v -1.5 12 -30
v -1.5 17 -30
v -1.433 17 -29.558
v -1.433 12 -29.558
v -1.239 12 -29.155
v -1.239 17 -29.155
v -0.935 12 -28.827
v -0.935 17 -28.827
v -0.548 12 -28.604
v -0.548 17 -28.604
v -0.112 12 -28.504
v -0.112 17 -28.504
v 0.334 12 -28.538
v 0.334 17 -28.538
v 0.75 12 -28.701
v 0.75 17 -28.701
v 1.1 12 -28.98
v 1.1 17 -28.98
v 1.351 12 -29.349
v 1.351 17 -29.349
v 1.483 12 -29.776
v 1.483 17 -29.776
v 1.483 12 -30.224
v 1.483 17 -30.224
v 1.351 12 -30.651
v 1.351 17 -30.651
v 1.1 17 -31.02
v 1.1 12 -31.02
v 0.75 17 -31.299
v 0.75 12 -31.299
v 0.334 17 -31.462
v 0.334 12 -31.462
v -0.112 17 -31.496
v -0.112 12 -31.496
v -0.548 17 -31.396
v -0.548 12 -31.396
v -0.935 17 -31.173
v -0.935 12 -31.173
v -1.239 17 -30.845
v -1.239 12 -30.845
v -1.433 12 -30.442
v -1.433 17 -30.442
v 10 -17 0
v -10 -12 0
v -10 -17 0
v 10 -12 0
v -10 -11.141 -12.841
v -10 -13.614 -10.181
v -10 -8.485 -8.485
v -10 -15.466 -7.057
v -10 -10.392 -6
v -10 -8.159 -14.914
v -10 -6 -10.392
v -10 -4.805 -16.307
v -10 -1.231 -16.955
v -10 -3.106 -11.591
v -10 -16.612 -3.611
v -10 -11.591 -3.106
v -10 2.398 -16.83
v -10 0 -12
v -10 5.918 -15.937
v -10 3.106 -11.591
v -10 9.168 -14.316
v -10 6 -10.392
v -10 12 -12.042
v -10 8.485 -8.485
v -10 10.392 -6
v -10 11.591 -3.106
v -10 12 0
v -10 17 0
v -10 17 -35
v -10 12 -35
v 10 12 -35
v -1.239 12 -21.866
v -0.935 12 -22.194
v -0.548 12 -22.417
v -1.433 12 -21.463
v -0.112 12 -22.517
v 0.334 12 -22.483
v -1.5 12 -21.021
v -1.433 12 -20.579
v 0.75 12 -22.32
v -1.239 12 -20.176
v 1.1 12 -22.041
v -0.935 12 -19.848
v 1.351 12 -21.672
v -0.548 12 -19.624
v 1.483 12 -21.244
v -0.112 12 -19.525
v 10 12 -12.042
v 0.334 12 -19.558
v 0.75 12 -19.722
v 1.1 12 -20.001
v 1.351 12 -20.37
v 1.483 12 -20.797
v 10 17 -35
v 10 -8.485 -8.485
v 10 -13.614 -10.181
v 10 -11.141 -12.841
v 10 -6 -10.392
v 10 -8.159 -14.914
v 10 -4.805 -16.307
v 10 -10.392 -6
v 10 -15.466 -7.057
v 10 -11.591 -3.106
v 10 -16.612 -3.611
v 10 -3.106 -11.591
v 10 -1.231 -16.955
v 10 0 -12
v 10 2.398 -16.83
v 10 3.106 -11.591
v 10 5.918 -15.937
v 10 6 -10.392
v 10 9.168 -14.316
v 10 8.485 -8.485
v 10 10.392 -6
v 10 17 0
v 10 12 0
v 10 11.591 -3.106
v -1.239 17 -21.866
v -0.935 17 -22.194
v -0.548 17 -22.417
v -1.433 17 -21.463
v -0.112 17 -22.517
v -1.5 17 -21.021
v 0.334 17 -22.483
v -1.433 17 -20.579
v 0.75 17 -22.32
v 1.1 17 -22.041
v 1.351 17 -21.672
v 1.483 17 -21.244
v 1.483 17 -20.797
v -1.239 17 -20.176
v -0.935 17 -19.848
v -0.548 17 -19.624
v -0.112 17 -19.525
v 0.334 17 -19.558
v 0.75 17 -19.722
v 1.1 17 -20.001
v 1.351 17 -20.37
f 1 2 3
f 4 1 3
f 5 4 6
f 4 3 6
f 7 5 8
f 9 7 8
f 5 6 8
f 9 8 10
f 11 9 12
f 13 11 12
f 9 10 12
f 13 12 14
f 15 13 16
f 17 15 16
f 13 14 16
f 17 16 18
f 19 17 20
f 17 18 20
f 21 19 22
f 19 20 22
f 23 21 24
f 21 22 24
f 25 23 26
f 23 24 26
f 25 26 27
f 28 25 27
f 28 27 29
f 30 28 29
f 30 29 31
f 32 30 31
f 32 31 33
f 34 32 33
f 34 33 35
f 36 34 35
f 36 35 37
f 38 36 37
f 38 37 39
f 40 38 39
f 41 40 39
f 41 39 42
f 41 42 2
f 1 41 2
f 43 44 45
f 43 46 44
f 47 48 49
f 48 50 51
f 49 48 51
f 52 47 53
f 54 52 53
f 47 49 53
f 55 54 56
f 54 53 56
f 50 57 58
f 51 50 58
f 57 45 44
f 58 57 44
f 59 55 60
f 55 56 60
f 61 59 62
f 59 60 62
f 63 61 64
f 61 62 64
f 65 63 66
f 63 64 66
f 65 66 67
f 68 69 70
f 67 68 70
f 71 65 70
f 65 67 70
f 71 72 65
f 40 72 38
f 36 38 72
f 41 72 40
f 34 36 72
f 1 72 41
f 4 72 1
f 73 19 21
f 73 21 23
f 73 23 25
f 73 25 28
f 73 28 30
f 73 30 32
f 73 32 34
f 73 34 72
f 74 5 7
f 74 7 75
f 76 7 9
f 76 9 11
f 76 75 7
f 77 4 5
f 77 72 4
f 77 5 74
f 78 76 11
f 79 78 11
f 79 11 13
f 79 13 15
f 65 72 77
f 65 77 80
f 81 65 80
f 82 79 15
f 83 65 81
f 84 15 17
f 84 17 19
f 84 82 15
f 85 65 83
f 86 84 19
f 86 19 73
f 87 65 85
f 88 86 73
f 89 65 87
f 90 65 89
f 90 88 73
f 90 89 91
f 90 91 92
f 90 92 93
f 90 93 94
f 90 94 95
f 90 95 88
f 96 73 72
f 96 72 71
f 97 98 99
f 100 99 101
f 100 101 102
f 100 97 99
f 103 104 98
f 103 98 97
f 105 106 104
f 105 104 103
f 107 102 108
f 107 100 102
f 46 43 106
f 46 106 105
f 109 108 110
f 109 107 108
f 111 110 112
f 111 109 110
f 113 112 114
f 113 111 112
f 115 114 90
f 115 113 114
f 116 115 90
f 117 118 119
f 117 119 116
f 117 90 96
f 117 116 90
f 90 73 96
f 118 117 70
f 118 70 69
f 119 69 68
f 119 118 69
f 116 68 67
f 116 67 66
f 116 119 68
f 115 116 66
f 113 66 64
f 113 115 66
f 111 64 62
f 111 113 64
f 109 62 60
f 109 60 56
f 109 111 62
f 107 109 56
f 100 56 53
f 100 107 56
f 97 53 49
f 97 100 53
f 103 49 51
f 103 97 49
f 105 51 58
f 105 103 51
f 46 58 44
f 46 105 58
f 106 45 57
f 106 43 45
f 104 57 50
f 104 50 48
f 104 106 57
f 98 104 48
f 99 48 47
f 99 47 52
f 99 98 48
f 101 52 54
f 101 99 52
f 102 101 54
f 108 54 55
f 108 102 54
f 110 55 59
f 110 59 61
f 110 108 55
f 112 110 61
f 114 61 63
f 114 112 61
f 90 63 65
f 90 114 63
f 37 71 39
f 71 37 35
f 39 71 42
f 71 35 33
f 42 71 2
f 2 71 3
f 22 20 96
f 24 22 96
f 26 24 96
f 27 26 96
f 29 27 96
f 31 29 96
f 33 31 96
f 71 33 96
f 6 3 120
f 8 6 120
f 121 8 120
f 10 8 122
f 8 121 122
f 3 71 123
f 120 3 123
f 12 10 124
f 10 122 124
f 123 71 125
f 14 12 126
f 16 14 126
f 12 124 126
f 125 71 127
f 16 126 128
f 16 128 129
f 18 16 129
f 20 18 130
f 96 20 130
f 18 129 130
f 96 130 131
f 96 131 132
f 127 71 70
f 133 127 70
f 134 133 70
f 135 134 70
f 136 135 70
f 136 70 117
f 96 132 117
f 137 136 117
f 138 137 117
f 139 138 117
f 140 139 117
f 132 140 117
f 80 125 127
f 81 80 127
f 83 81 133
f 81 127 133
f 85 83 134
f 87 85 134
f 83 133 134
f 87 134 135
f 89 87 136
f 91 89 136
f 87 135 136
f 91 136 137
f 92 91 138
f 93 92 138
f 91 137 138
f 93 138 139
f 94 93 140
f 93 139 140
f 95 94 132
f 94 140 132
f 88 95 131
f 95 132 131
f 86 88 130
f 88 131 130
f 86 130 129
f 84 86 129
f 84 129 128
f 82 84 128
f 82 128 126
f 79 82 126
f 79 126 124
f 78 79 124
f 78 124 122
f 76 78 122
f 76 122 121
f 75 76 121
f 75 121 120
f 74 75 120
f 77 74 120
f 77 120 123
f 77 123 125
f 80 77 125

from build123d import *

# Parameters (mm, degrees)
F1_DEPTH = 10
F3_DEPTH = 5
F4_D     = 3


with BuildPart() as f1:
    # F0 (on Right) → F1 (new body, symmetric)
    with BuildSketch(Plane.YZ):
        with BuildLine():
            ThreePointArc((12, 0), (0, -12), (-12, 0))
            Line((-12, 0), (-17.0000008196, 0))
            ThreePointArc((-17.0000008196, 0), (-6.5192030966, -15.7003190684), (12, -12.0415957358))
            Line((12, -12.0415957358), (12, 0))
        make_face()
        with BuildLine():
            Line((17.0000008196, -30), (17.0000008196, 0))
            ThreePointArc((17.0000008196, 0), (15.7003190684, -6.5192030966), (12, -12.0415957358))
            Line((12, -12.0415957358), (12, -30))
            Line((12, -30), (17.0000008196, -30))
        make_face()
        with BuildLine():
            Line((17.0000008196, 0), (12, 0))
            Line((12, 0), (12, -12.0415957358))
            ThreePointArc((12, -12.0415957358), (15.7003190684, -6.5192030966), (17.0000008196, 0))
        make_face()
    extrude(amount=F1_DEPTH, both=True)

    # F3 (add): a face of the model
    f3_faces = [f1.faces().sort_by_distance(p)[0] for p in [
        (0, 14.5000004098, -30),
    ]]
    extrude(f3_faces, amount=F3_DEPTH)

    # F4 (through all)
    with Locations(Plane.XZ.offset(-12)):
        with Locations((0, -30), (0, -21.0207978679)):
            Hole(F4_D / 2)


solid = f1.part
